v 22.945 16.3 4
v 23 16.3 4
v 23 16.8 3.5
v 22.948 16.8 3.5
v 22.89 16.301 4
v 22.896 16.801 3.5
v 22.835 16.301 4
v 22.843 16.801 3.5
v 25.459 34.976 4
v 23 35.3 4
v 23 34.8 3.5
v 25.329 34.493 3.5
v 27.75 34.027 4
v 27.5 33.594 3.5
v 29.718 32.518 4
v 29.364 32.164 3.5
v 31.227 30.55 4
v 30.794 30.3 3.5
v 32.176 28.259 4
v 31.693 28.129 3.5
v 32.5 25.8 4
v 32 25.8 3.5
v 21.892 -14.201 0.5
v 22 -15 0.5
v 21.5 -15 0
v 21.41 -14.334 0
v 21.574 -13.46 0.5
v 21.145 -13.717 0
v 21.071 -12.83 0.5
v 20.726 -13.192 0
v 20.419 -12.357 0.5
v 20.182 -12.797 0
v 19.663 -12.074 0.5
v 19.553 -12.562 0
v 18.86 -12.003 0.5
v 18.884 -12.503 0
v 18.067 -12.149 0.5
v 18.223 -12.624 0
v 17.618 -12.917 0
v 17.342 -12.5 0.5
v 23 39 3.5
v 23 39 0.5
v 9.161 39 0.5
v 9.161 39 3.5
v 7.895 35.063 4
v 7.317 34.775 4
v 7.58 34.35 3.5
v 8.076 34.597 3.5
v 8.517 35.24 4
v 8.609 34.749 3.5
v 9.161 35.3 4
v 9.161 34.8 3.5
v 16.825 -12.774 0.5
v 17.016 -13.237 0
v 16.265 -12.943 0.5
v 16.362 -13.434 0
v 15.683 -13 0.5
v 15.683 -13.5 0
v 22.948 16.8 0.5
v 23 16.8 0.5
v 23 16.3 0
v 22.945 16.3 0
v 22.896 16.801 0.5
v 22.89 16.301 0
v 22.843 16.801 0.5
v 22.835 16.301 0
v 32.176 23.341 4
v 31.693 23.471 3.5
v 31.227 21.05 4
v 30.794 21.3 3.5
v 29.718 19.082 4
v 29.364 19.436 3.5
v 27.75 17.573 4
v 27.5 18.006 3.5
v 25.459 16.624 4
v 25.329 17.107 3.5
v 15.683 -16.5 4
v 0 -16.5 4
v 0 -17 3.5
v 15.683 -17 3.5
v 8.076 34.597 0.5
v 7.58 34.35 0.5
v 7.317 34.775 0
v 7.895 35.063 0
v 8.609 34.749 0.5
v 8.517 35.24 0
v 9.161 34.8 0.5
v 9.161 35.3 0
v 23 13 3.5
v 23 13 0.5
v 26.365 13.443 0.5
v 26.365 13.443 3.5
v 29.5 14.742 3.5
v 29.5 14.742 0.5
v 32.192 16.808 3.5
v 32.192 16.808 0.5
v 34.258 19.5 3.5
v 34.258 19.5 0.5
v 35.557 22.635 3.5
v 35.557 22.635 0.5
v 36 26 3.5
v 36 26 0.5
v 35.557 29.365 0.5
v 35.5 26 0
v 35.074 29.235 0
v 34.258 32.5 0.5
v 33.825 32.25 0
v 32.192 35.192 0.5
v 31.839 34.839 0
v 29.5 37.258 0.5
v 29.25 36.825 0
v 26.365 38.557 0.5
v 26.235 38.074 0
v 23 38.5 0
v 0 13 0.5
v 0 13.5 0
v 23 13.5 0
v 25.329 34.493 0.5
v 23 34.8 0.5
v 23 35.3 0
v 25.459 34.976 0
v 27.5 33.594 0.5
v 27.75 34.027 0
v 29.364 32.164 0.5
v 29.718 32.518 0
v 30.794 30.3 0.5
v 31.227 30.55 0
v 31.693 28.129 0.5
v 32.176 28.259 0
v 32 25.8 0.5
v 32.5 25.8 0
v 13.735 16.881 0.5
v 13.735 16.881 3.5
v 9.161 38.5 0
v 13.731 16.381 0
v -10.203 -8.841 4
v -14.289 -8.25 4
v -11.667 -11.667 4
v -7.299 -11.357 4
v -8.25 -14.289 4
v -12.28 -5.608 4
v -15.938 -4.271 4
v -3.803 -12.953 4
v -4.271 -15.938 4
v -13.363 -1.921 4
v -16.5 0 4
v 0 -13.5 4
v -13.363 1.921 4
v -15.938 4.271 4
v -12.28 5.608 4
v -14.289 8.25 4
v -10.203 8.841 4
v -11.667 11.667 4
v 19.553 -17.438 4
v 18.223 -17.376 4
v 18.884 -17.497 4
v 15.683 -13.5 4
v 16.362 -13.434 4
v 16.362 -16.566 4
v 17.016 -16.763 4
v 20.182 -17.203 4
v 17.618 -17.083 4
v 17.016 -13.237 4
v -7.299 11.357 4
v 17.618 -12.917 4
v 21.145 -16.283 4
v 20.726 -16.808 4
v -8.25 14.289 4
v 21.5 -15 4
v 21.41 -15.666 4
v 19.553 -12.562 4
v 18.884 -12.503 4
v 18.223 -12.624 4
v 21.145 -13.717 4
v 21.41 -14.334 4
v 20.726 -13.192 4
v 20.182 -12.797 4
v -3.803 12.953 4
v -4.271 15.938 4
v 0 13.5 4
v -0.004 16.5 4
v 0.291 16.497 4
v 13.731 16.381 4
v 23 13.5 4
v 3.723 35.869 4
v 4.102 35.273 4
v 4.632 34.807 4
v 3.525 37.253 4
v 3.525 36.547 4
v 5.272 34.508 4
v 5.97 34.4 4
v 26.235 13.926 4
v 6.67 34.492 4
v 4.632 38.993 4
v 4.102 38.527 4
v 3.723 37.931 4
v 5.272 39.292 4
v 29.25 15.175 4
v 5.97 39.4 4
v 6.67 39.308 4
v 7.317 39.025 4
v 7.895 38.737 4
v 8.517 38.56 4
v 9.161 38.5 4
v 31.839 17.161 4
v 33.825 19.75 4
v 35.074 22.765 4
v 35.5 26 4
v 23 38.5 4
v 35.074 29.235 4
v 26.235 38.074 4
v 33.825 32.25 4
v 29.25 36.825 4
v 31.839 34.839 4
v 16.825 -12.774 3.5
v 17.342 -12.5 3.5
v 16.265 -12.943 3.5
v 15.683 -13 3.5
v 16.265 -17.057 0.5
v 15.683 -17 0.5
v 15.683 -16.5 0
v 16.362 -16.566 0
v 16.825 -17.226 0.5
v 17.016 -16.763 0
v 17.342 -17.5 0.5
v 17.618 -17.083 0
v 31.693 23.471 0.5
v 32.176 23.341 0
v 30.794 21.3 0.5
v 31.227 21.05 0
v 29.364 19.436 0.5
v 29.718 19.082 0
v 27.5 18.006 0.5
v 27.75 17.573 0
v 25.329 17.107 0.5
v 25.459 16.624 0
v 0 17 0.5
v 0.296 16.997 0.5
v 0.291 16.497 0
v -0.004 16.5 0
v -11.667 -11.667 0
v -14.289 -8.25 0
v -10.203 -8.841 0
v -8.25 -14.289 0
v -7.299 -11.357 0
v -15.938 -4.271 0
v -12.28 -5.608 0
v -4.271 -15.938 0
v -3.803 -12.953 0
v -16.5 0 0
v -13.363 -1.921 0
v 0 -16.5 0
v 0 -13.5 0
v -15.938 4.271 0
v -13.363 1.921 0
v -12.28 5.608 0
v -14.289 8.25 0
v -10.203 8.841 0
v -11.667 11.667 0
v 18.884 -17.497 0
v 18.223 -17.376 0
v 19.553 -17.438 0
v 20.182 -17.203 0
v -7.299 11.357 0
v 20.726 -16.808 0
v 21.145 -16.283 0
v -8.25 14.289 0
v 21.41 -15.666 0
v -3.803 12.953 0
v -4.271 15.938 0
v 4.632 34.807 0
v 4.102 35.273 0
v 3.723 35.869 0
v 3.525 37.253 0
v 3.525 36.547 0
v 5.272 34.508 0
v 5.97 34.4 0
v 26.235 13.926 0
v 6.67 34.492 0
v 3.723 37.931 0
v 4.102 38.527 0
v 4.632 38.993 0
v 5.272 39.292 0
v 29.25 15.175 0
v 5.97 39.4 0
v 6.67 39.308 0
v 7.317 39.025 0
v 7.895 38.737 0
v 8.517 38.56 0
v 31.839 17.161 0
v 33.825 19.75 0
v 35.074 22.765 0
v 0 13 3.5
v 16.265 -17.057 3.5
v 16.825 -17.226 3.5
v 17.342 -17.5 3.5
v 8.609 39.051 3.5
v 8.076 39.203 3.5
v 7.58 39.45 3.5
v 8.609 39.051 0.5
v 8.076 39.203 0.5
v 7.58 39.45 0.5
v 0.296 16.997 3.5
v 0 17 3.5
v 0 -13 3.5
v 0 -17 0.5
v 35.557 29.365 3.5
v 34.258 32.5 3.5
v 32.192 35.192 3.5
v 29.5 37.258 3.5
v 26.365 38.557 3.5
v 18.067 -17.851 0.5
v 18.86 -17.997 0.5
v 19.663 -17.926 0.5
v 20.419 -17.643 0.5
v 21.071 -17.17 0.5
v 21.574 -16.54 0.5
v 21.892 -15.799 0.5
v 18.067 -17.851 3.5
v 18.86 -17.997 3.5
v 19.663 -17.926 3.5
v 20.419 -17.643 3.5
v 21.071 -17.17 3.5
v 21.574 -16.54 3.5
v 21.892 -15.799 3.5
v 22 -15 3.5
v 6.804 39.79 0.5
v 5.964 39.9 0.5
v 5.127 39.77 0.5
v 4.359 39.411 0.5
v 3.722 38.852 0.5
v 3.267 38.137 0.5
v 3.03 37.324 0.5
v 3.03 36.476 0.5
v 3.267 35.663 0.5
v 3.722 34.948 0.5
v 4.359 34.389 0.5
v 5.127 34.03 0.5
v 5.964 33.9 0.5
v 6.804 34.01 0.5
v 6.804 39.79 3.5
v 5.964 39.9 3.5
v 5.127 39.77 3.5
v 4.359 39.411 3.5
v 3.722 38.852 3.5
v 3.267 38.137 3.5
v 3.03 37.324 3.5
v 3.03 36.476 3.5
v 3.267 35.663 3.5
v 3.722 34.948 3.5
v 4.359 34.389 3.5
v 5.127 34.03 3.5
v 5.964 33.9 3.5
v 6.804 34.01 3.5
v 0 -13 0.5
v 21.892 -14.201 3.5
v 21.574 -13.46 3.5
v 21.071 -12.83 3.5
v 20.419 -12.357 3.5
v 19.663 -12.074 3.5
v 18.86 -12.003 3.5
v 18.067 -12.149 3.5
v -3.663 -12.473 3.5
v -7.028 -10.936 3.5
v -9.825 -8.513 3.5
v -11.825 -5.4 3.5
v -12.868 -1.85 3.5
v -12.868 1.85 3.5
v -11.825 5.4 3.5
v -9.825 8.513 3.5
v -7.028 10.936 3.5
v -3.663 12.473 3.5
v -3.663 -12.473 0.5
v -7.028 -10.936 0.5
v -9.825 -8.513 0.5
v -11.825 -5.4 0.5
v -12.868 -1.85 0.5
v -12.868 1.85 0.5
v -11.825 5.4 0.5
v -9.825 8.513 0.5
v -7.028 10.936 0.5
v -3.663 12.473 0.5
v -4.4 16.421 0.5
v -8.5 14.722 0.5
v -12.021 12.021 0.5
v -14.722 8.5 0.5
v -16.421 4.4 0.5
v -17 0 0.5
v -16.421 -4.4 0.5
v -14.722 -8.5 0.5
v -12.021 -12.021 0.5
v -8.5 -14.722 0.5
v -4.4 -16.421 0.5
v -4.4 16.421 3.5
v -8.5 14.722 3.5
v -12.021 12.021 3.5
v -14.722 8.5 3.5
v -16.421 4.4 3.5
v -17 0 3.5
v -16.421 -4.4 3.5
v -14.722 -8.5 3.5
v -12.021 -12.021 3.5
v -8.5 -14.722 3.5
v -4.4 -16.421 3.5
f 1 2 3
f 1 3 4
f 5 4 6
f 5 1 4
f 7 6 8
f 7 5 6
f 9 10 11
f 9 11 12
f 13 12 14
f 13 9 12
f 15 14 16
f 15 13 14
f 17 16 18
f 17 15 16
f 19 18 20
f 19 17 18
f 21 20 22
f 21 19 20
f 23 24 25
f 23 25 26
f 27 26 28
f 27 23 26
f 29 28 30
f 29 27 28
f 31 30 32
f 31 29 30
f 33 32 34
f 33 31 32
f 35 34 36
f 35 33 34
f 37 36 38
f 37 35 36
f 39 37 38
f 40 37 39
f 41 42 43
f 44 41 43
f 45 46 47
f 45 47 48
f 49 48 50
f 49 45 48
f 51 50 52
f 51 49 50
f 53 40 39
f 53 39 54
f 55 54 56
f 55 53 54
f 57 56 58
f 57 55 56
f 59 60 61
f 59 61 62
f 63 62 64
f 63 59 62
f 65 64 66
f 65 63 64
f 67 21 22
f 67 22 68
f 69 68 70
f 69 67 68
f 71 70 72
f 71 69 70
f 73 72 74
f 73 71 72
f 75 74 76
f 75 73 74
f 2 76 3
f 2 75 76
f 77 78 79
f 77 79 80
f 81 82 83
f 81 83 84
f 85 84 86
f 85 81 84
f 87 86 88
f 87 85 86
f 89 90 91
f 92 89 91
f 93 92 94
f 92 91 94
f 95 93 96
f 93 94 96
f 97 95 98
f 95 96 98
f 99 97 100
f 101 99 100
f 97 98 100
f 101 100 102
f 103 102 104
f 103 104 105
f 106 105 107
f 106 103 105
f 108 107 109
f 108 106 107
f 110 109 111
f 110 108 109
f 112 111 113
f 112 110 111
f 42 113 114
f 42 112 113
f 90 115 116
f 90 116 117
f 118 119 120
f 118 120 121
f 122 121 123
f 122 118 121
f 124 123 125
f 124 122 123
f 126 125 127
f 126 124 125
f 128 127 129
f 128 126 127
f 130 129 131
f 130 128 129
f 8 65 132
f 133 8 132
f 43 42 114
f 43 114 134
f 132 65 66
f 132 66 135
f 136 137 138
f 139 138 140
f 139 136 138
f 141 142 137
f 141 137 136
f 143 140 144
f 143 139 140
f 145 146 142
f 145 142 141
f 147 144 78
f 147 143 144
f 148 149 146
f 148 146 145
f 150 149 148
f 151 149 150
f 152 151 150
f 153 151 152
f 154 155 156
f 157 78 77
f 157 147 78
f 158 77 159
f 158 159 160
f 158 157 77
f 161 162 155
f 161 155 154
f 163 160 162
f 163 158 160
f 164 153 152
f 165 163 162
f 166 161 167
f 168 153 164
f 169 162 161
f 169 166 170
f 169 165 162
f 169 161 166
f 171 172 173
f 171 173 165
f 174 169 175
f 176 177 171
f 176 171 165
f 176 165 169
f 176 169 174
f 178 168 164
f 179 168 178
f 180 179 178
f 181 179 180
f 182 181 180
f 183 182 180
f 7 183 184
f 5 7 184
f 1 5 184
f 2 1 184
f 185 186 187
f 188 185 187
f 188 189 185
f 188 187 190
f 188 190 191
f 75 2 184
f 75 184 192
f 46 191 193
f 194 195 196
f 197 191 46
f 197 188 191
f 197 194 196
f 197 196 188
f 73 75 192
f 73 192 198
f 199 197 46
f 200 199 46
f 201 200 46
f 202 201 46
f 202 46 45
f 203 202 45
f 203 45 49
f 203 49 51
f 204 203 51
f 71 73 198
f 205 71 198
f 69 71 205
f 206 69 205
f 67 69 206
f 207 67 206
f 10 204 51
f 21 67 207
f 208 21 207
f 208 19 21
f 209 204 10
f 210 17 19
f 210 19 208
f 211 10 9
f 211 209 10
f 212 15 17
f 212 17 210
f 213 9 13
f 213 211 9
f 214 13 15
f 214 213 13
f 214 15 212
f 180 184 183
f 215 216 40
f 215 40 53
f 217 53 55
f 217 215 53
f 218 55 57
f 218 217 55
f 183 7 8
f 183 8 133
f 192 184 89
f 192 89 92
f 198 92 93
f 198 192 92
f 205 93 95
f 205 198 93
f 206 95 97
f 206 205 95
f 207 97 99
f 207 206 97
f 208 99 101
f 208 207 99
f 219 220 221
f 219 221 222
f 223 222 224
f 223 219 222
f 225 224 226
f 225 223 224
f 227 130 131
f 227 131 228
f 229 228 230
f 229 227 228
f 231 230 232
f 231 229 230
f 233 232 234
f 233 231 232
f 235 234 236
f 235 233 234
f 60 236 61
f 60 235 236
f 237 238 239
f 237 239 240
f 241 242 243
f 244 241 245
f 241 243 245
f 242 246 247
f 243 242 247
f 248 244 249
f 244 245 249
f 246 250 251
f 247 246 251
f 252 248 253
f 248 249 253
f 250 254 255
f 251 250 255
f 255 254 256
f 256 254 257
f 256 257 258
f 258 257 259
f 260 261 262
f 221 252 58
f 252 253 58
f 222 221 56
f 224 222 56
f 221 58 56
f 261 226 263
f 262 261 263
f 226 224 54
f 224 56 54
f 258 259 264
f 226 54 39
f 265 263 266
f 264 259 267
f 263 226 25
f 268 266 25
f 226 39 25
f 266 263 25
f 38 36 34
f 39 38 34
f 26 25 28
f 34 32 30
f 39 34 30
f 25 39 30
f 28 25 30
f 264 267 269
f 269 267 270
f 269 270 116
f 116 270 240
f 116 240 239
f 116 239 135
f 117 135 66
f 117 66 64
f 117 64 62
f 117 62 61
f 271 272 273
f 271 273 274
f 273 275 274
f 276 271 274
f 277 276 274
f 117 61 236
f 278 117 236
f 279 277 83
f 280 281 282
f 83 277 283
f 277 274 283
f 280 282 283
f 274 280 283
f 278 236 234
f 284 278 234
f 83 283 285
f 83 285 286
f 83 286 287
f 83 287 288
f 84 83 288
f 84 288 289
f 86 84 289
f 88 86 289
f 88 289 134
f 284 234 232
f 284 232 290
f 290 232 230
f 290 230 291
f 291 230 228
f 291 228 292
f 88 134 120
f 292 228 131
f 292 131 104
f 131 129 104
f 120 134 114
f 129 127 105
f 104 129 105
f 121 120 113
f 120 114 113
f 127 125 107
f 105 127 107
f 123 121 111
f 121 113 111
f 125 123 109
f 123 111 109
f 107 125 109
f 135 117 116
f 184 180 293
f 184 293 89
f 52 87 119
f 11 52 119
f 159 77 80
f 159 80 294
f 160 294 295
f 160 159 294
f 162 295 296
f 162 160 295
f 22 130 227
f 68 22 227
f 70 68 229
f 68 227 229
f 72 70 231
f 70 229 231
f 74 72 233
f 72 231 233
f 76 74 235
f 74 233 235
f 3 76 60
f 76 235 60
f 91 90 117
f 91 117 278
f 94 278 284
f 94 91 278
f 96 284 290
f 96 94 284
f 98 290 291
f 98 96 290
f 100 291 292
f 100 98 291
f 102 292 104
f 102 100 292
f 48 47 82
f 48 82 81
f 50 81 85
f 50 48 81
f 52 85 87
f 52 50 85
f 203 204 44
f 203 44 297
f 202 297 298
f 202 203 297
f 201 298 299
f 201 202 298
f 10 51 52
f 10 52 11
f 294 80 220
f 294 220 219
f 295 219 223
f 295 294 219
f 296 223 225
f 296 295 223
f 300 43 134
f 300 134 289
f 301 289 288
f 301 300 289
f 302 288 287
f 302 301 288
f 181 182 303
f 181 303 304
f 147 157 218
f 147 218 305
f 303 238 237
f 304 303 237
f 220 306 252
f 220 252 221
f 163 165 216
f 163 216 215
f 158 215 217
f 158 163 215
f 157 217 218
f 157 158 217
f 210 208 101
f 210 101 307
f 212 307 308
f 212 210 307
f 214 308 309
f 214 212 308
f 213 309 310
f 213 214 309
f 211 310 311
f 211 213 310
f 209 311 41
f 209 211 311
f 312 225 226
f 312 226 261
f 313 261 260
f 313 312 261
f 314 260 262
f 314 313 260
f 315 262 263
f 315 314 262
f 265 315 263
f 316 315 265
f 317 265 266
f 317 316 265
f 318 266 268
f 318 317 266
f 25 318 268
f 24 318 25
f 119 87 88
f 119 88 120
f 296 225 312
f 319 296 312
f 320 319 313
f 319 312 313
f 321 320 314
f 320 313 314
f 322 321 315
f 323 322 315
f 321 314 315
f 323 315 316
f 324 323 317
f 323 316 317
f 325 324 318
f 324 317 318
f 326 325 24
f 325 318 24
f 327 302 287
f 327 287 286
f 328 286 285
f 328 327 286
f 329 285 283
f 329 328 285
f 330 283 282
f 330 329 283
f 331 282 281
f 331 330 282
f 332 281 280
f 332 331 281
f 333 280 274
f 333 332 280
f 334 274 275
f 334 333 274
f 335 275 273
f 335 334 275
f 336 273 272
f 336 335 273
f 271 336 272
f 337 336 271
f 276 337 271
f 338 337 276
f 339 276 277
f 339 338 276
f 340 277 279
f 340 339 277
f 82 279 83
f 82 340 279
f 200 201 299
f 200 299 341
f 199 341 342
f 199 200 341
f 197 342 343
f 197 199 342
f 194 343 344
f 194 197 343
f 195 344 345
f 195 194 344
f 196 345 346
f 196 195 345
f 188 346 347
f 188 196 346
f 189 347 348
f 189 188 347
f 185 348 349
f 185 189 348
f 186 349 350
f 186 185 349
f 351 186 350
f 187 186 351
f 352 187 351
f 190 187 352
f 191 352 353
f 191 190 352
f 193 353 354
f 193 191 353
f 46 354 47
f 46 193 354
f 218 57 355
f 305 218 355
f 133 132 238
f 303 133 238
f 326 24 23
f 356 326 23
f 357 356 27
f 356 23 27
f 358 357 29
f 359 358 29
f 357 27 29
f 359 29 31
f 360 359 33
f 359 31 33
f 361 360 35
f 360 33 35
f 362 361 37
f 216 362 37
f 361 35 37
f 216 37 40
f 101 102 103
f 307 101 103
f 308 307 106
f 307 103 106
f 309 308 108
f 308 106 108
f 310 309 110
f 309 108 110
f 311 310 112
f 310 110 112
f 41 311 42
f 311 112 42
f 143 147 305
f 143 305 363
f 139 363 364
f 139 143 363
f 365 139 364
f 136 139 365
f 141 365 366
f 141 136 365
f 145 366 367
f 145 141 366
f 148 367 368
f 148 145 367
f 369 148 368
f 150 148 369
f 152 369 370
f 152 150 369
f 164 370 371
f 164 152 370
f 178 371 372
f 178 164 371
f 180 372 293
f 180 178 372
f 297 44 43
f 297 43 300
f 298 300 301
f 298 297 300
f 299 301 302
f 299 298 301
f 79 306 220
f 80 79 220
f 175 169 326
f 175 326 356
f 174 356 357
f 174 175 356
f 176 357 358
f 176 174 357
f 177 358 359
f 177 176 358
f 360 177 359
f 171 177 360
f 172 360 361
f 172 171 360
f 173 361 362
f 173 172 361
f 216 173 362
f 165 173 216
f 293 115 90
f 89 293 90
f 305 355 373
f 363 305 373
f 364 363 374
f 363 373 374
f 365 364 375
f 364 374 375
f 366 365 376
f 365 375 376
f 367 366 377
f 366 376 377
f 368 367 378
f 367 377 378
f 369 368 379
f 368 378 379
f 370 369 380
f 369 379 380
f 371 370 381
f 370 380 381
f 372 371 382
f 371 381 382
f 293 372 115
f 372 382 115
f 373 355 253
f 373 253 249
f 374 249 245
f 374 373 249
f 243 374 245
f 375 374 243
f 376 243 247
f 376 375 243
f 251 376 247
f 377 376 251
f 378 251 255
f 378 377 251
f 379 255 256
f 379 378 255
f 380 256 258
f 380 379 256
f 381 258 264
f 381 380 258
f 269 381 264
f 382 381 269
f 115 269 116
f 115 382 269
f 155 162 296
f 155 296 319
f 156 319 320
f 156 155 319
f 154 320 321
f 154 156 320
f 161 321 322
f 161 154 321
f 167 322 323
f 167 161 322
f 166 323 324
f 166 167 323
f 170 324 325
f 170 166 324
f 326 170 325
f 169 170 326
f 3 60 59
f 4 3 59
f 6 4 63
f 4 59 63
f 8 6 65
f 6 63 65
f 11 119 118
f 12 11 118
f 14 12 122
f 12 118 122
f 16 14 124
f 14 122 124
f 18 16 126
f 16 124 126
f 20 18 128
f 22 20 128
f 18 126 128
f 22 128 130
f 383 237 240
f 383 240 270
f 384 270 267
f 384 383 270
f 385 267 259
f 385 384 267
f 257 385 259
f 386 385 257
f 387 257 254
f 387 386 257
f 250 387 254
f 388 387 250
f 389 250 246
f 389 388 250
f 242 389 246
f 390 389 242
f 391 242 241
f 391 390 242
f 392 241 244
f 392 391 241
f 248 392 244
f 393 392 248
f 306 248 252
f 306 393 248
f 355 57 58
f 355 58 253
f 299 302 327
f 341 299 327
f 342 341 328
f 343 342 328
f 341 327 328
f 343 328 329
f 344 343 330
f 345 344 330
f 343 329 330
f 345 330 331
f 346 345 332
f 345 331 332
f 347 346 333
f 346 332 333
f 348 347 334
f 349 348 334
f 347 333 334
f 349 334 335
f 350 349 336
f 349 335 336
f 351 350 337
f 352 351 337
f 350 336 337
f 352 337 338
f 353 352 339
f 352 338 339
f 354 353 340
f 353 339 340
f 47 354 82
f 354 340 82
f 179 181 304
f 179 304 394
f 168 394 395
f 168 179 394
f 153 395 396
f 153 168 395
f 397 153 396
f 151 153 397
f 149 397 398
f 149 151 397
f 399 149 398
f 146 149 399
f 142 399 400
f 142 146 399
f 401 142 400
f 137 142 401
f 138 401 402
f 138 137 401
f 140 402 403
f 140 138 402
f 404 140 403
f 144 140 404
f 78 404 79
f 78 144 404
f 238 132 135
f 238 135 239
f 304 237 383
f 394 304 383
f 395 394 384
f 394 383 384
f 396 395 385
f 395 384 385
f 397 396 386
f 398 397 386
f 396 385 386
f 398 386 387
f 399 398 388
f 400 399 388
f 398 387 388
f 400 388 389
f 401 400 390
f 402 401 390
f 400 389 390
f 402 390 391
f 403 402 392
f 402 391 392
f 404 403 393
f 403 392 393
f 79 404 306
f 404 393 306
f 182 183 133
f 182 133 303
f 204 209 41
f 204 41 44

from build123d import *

# Parameters (mm, degrees)
F1_DEPTH = 4
F2_R     = 3
F3_SIZE  = 0.5


with BuildPart() as f1:
    # F0 (on Top) → F1 (new body)
    with BuildSketch(Plane.XY):
        with BuildLine():
            Line((0.2956298201, 16.9974293059), (0, 17))
            ThreePointArc((0, 17), (-17, 0), (0, -17))
            ThreePointArc((0, -17), (5.8309518948, -15.9687194227), (10.9544511501, -13))
            Line((10.9544511501, -13), (0, -13))
            ThreePointArc((0, -13), (-13, 0), (0, 13))
            Line((0, 13), (10.9544511501, 13))
            ThreePointArc((10.9544511501, 13), (5.9695846357, 15.9174137119), (0.2956298201, 16.9974293059))
        make_face()
        with BuildLine():
            ThreePointArc((10.9544511501, -13), (5.8309518948, -15.9687194227), (0, -17))
            Line((0, -17), (16.7639320225, -17))
            ThreePointArc((16.7639320225, -17), (16, -15), (16.7639320225, -13))
            Line((16.7639320225, -13), (10.9544511501, -13))
        make_face()
        with BuildLine():
            Line((13.73523492, 16.8805631746), (0.2956298201, 16.9974293059))
            ThreePointArc((0.2956298201, 16.9974293059), (5.9695846357, 15.9174137119), (10.9544511501, 13))
            Line((10.9544511501, 13), (23, 13))
            ThreePointArc((23, 13), (17.9776837381, 14.0093228146), (13.73523492, 16.8805631746))
        make_face()
        with BuildLine():
            ThreePointArc((16.7639320225, -13), (16, -15), (16.7639320225, -17))
            Line((16.7639320225, -17), (19, -17))
            Line((19, -17), (19, -13))
            Line((19, -13), (16.7639320225, -13))
        make_face()
        with BuildLine():
            Line((19, -17), (16.7639320225, -17))
            ThreePointArc((16.7639320225, -17), (20.0704662693, -17.8025170769), (22, -15))
            ThreePointArc((22, -15), (20.0704662693, -12.1974829231), (16.7639320225, -13))
            Line((16.7639320225, -13), (19, -13))
            Line((19, -13), (19, -17))
        make_face()
        with BuildLine():
            Line((22.8434900953, 16.8013609557), (13.73523492, 16.8805631746))
            ThreePointArc((13.73523492, 16.8805631746), (17.9776837381, 14.0093228146), (23, 13))
            ThreePointArc((23, 13), (32.1923881554, 16.8076118446), (36, 26))
            ThreePointArc((36, 26), (32.1923881554, 35.1923881554), (23, 39))
            ThreePointArc((23, 39), (17.775059809, 37.903780912), (13.4313010289, 34.8))
            Line((13.4313010289, 34.8), (23, 34.8))
            ThreePointArc((23, 34.8), (29.3639610307, 32.1639610307), (32, 25.8))
            ThreePointArc((32, 25.8), (29.3639610307, 19.4360389693), (23, 16.8))
            ThreePointArc((23, 16.8), (22.9217420891, 16.8003402454), (22.8434900953, 16.8013609557))
        make_face()
        with BuildLine():
            Line((8.1424285286, 34.8), (13.4313010289, 34.8))
            ThreePointArc((13.4313010289, 34.8), (17.775059809, 37.903780912), (23, 39))
            Line((23, 39), (8.1424285286, 39))
            ThreePointArc((8.1424285286, 39), (8.7773445578, 38.0341768853), (9, 36.9))
            ThreePointArc((9, 36.9), (8.7773445578, 35.7658231147), (8.1424285286, 34.8))
        make_face()
        with BuildLine():
            ThreePointArc((8.1424285286, 39), (3, 36.9), (8.1424285286, 34.8))
            Line((8.1424285286, 34.8), (6, 34.8))
            Line((6, 34.8), (6, 39))
            Line((6, 39), (8.1424285286, 39))
        make_face()
        with BuildLine():
            Line((6, 34.8), (8.1424285286, 34.8))
            ThreePointArc((8.1424285286, 34.8), (8.7773445578, 35.7658231147), (9, 36.9))
            ThreePointArc((9, 36.9), (8.7773445578, 38.0341768853), (8.1424285286, 39))
            Line((8.1424285286, 39), (6, 39))
            Line((6, 39), (6, 34.8))
        make_face()
    extrude(amount=F1_DEPTH)

    # F2
    f2_edges = [f1.edges().sort_by_distance(p)[0] for p in [
        (16.763932, -17, 2),
        (8.142429, 34.8, 2),
        (16.763932, -13, 2),
        (8.142429, 39, 2),
    ]]
    fillet(f2_edges, radius=F2_R)

    # F3
    f3_edges = [f1.edges().sort_by_distance(p)[0] for p in [
        (7.841688, -17, 4),
        (7.841688, -13, 4),
        (-13, 0, 4),
        (-17, 0, 4),
        (11.5, 13, 4),
        (11.421745, 16.90068, 4),
        (22, -15, 4),
        (16.549401, -12.872281, 4),
        (16.549401, -17.127719, 4),
        (36, 26, 4),
        (31.99966, 25.721742, 4),
        (16.080348, 34.8, 4),
        (16.080348, 39, 4),
        (8.339112, 34.685308, 4),
        (8.339112, 39.114692, 4),
        (3, 36.9, 4),
        (22, -15, 0),
        (16.549401, -17.127719, 0),
        (7.841688, -13, 0),
        (7.841688, -17, 0),
        (16.549401, -12.872281, 0),
        (-13, 0, 0),
        (-17, 0, 0),
        (11.5, 13, 0),
        (11.421745, 16.90068, 0),
        (31.99966, 25.721742, 0),
        (16.080348, 34.8, 0),
        (8.339112, 34.685308, 0),
        (3, 36.9, 0),
        (36, 26, 0),
        (8.339112, 39.114692, 0),
        (16.080348, 39, 0),
    ]]
    chamfer(f3_edges, length=F3_SIZE)


solid = f1.part
